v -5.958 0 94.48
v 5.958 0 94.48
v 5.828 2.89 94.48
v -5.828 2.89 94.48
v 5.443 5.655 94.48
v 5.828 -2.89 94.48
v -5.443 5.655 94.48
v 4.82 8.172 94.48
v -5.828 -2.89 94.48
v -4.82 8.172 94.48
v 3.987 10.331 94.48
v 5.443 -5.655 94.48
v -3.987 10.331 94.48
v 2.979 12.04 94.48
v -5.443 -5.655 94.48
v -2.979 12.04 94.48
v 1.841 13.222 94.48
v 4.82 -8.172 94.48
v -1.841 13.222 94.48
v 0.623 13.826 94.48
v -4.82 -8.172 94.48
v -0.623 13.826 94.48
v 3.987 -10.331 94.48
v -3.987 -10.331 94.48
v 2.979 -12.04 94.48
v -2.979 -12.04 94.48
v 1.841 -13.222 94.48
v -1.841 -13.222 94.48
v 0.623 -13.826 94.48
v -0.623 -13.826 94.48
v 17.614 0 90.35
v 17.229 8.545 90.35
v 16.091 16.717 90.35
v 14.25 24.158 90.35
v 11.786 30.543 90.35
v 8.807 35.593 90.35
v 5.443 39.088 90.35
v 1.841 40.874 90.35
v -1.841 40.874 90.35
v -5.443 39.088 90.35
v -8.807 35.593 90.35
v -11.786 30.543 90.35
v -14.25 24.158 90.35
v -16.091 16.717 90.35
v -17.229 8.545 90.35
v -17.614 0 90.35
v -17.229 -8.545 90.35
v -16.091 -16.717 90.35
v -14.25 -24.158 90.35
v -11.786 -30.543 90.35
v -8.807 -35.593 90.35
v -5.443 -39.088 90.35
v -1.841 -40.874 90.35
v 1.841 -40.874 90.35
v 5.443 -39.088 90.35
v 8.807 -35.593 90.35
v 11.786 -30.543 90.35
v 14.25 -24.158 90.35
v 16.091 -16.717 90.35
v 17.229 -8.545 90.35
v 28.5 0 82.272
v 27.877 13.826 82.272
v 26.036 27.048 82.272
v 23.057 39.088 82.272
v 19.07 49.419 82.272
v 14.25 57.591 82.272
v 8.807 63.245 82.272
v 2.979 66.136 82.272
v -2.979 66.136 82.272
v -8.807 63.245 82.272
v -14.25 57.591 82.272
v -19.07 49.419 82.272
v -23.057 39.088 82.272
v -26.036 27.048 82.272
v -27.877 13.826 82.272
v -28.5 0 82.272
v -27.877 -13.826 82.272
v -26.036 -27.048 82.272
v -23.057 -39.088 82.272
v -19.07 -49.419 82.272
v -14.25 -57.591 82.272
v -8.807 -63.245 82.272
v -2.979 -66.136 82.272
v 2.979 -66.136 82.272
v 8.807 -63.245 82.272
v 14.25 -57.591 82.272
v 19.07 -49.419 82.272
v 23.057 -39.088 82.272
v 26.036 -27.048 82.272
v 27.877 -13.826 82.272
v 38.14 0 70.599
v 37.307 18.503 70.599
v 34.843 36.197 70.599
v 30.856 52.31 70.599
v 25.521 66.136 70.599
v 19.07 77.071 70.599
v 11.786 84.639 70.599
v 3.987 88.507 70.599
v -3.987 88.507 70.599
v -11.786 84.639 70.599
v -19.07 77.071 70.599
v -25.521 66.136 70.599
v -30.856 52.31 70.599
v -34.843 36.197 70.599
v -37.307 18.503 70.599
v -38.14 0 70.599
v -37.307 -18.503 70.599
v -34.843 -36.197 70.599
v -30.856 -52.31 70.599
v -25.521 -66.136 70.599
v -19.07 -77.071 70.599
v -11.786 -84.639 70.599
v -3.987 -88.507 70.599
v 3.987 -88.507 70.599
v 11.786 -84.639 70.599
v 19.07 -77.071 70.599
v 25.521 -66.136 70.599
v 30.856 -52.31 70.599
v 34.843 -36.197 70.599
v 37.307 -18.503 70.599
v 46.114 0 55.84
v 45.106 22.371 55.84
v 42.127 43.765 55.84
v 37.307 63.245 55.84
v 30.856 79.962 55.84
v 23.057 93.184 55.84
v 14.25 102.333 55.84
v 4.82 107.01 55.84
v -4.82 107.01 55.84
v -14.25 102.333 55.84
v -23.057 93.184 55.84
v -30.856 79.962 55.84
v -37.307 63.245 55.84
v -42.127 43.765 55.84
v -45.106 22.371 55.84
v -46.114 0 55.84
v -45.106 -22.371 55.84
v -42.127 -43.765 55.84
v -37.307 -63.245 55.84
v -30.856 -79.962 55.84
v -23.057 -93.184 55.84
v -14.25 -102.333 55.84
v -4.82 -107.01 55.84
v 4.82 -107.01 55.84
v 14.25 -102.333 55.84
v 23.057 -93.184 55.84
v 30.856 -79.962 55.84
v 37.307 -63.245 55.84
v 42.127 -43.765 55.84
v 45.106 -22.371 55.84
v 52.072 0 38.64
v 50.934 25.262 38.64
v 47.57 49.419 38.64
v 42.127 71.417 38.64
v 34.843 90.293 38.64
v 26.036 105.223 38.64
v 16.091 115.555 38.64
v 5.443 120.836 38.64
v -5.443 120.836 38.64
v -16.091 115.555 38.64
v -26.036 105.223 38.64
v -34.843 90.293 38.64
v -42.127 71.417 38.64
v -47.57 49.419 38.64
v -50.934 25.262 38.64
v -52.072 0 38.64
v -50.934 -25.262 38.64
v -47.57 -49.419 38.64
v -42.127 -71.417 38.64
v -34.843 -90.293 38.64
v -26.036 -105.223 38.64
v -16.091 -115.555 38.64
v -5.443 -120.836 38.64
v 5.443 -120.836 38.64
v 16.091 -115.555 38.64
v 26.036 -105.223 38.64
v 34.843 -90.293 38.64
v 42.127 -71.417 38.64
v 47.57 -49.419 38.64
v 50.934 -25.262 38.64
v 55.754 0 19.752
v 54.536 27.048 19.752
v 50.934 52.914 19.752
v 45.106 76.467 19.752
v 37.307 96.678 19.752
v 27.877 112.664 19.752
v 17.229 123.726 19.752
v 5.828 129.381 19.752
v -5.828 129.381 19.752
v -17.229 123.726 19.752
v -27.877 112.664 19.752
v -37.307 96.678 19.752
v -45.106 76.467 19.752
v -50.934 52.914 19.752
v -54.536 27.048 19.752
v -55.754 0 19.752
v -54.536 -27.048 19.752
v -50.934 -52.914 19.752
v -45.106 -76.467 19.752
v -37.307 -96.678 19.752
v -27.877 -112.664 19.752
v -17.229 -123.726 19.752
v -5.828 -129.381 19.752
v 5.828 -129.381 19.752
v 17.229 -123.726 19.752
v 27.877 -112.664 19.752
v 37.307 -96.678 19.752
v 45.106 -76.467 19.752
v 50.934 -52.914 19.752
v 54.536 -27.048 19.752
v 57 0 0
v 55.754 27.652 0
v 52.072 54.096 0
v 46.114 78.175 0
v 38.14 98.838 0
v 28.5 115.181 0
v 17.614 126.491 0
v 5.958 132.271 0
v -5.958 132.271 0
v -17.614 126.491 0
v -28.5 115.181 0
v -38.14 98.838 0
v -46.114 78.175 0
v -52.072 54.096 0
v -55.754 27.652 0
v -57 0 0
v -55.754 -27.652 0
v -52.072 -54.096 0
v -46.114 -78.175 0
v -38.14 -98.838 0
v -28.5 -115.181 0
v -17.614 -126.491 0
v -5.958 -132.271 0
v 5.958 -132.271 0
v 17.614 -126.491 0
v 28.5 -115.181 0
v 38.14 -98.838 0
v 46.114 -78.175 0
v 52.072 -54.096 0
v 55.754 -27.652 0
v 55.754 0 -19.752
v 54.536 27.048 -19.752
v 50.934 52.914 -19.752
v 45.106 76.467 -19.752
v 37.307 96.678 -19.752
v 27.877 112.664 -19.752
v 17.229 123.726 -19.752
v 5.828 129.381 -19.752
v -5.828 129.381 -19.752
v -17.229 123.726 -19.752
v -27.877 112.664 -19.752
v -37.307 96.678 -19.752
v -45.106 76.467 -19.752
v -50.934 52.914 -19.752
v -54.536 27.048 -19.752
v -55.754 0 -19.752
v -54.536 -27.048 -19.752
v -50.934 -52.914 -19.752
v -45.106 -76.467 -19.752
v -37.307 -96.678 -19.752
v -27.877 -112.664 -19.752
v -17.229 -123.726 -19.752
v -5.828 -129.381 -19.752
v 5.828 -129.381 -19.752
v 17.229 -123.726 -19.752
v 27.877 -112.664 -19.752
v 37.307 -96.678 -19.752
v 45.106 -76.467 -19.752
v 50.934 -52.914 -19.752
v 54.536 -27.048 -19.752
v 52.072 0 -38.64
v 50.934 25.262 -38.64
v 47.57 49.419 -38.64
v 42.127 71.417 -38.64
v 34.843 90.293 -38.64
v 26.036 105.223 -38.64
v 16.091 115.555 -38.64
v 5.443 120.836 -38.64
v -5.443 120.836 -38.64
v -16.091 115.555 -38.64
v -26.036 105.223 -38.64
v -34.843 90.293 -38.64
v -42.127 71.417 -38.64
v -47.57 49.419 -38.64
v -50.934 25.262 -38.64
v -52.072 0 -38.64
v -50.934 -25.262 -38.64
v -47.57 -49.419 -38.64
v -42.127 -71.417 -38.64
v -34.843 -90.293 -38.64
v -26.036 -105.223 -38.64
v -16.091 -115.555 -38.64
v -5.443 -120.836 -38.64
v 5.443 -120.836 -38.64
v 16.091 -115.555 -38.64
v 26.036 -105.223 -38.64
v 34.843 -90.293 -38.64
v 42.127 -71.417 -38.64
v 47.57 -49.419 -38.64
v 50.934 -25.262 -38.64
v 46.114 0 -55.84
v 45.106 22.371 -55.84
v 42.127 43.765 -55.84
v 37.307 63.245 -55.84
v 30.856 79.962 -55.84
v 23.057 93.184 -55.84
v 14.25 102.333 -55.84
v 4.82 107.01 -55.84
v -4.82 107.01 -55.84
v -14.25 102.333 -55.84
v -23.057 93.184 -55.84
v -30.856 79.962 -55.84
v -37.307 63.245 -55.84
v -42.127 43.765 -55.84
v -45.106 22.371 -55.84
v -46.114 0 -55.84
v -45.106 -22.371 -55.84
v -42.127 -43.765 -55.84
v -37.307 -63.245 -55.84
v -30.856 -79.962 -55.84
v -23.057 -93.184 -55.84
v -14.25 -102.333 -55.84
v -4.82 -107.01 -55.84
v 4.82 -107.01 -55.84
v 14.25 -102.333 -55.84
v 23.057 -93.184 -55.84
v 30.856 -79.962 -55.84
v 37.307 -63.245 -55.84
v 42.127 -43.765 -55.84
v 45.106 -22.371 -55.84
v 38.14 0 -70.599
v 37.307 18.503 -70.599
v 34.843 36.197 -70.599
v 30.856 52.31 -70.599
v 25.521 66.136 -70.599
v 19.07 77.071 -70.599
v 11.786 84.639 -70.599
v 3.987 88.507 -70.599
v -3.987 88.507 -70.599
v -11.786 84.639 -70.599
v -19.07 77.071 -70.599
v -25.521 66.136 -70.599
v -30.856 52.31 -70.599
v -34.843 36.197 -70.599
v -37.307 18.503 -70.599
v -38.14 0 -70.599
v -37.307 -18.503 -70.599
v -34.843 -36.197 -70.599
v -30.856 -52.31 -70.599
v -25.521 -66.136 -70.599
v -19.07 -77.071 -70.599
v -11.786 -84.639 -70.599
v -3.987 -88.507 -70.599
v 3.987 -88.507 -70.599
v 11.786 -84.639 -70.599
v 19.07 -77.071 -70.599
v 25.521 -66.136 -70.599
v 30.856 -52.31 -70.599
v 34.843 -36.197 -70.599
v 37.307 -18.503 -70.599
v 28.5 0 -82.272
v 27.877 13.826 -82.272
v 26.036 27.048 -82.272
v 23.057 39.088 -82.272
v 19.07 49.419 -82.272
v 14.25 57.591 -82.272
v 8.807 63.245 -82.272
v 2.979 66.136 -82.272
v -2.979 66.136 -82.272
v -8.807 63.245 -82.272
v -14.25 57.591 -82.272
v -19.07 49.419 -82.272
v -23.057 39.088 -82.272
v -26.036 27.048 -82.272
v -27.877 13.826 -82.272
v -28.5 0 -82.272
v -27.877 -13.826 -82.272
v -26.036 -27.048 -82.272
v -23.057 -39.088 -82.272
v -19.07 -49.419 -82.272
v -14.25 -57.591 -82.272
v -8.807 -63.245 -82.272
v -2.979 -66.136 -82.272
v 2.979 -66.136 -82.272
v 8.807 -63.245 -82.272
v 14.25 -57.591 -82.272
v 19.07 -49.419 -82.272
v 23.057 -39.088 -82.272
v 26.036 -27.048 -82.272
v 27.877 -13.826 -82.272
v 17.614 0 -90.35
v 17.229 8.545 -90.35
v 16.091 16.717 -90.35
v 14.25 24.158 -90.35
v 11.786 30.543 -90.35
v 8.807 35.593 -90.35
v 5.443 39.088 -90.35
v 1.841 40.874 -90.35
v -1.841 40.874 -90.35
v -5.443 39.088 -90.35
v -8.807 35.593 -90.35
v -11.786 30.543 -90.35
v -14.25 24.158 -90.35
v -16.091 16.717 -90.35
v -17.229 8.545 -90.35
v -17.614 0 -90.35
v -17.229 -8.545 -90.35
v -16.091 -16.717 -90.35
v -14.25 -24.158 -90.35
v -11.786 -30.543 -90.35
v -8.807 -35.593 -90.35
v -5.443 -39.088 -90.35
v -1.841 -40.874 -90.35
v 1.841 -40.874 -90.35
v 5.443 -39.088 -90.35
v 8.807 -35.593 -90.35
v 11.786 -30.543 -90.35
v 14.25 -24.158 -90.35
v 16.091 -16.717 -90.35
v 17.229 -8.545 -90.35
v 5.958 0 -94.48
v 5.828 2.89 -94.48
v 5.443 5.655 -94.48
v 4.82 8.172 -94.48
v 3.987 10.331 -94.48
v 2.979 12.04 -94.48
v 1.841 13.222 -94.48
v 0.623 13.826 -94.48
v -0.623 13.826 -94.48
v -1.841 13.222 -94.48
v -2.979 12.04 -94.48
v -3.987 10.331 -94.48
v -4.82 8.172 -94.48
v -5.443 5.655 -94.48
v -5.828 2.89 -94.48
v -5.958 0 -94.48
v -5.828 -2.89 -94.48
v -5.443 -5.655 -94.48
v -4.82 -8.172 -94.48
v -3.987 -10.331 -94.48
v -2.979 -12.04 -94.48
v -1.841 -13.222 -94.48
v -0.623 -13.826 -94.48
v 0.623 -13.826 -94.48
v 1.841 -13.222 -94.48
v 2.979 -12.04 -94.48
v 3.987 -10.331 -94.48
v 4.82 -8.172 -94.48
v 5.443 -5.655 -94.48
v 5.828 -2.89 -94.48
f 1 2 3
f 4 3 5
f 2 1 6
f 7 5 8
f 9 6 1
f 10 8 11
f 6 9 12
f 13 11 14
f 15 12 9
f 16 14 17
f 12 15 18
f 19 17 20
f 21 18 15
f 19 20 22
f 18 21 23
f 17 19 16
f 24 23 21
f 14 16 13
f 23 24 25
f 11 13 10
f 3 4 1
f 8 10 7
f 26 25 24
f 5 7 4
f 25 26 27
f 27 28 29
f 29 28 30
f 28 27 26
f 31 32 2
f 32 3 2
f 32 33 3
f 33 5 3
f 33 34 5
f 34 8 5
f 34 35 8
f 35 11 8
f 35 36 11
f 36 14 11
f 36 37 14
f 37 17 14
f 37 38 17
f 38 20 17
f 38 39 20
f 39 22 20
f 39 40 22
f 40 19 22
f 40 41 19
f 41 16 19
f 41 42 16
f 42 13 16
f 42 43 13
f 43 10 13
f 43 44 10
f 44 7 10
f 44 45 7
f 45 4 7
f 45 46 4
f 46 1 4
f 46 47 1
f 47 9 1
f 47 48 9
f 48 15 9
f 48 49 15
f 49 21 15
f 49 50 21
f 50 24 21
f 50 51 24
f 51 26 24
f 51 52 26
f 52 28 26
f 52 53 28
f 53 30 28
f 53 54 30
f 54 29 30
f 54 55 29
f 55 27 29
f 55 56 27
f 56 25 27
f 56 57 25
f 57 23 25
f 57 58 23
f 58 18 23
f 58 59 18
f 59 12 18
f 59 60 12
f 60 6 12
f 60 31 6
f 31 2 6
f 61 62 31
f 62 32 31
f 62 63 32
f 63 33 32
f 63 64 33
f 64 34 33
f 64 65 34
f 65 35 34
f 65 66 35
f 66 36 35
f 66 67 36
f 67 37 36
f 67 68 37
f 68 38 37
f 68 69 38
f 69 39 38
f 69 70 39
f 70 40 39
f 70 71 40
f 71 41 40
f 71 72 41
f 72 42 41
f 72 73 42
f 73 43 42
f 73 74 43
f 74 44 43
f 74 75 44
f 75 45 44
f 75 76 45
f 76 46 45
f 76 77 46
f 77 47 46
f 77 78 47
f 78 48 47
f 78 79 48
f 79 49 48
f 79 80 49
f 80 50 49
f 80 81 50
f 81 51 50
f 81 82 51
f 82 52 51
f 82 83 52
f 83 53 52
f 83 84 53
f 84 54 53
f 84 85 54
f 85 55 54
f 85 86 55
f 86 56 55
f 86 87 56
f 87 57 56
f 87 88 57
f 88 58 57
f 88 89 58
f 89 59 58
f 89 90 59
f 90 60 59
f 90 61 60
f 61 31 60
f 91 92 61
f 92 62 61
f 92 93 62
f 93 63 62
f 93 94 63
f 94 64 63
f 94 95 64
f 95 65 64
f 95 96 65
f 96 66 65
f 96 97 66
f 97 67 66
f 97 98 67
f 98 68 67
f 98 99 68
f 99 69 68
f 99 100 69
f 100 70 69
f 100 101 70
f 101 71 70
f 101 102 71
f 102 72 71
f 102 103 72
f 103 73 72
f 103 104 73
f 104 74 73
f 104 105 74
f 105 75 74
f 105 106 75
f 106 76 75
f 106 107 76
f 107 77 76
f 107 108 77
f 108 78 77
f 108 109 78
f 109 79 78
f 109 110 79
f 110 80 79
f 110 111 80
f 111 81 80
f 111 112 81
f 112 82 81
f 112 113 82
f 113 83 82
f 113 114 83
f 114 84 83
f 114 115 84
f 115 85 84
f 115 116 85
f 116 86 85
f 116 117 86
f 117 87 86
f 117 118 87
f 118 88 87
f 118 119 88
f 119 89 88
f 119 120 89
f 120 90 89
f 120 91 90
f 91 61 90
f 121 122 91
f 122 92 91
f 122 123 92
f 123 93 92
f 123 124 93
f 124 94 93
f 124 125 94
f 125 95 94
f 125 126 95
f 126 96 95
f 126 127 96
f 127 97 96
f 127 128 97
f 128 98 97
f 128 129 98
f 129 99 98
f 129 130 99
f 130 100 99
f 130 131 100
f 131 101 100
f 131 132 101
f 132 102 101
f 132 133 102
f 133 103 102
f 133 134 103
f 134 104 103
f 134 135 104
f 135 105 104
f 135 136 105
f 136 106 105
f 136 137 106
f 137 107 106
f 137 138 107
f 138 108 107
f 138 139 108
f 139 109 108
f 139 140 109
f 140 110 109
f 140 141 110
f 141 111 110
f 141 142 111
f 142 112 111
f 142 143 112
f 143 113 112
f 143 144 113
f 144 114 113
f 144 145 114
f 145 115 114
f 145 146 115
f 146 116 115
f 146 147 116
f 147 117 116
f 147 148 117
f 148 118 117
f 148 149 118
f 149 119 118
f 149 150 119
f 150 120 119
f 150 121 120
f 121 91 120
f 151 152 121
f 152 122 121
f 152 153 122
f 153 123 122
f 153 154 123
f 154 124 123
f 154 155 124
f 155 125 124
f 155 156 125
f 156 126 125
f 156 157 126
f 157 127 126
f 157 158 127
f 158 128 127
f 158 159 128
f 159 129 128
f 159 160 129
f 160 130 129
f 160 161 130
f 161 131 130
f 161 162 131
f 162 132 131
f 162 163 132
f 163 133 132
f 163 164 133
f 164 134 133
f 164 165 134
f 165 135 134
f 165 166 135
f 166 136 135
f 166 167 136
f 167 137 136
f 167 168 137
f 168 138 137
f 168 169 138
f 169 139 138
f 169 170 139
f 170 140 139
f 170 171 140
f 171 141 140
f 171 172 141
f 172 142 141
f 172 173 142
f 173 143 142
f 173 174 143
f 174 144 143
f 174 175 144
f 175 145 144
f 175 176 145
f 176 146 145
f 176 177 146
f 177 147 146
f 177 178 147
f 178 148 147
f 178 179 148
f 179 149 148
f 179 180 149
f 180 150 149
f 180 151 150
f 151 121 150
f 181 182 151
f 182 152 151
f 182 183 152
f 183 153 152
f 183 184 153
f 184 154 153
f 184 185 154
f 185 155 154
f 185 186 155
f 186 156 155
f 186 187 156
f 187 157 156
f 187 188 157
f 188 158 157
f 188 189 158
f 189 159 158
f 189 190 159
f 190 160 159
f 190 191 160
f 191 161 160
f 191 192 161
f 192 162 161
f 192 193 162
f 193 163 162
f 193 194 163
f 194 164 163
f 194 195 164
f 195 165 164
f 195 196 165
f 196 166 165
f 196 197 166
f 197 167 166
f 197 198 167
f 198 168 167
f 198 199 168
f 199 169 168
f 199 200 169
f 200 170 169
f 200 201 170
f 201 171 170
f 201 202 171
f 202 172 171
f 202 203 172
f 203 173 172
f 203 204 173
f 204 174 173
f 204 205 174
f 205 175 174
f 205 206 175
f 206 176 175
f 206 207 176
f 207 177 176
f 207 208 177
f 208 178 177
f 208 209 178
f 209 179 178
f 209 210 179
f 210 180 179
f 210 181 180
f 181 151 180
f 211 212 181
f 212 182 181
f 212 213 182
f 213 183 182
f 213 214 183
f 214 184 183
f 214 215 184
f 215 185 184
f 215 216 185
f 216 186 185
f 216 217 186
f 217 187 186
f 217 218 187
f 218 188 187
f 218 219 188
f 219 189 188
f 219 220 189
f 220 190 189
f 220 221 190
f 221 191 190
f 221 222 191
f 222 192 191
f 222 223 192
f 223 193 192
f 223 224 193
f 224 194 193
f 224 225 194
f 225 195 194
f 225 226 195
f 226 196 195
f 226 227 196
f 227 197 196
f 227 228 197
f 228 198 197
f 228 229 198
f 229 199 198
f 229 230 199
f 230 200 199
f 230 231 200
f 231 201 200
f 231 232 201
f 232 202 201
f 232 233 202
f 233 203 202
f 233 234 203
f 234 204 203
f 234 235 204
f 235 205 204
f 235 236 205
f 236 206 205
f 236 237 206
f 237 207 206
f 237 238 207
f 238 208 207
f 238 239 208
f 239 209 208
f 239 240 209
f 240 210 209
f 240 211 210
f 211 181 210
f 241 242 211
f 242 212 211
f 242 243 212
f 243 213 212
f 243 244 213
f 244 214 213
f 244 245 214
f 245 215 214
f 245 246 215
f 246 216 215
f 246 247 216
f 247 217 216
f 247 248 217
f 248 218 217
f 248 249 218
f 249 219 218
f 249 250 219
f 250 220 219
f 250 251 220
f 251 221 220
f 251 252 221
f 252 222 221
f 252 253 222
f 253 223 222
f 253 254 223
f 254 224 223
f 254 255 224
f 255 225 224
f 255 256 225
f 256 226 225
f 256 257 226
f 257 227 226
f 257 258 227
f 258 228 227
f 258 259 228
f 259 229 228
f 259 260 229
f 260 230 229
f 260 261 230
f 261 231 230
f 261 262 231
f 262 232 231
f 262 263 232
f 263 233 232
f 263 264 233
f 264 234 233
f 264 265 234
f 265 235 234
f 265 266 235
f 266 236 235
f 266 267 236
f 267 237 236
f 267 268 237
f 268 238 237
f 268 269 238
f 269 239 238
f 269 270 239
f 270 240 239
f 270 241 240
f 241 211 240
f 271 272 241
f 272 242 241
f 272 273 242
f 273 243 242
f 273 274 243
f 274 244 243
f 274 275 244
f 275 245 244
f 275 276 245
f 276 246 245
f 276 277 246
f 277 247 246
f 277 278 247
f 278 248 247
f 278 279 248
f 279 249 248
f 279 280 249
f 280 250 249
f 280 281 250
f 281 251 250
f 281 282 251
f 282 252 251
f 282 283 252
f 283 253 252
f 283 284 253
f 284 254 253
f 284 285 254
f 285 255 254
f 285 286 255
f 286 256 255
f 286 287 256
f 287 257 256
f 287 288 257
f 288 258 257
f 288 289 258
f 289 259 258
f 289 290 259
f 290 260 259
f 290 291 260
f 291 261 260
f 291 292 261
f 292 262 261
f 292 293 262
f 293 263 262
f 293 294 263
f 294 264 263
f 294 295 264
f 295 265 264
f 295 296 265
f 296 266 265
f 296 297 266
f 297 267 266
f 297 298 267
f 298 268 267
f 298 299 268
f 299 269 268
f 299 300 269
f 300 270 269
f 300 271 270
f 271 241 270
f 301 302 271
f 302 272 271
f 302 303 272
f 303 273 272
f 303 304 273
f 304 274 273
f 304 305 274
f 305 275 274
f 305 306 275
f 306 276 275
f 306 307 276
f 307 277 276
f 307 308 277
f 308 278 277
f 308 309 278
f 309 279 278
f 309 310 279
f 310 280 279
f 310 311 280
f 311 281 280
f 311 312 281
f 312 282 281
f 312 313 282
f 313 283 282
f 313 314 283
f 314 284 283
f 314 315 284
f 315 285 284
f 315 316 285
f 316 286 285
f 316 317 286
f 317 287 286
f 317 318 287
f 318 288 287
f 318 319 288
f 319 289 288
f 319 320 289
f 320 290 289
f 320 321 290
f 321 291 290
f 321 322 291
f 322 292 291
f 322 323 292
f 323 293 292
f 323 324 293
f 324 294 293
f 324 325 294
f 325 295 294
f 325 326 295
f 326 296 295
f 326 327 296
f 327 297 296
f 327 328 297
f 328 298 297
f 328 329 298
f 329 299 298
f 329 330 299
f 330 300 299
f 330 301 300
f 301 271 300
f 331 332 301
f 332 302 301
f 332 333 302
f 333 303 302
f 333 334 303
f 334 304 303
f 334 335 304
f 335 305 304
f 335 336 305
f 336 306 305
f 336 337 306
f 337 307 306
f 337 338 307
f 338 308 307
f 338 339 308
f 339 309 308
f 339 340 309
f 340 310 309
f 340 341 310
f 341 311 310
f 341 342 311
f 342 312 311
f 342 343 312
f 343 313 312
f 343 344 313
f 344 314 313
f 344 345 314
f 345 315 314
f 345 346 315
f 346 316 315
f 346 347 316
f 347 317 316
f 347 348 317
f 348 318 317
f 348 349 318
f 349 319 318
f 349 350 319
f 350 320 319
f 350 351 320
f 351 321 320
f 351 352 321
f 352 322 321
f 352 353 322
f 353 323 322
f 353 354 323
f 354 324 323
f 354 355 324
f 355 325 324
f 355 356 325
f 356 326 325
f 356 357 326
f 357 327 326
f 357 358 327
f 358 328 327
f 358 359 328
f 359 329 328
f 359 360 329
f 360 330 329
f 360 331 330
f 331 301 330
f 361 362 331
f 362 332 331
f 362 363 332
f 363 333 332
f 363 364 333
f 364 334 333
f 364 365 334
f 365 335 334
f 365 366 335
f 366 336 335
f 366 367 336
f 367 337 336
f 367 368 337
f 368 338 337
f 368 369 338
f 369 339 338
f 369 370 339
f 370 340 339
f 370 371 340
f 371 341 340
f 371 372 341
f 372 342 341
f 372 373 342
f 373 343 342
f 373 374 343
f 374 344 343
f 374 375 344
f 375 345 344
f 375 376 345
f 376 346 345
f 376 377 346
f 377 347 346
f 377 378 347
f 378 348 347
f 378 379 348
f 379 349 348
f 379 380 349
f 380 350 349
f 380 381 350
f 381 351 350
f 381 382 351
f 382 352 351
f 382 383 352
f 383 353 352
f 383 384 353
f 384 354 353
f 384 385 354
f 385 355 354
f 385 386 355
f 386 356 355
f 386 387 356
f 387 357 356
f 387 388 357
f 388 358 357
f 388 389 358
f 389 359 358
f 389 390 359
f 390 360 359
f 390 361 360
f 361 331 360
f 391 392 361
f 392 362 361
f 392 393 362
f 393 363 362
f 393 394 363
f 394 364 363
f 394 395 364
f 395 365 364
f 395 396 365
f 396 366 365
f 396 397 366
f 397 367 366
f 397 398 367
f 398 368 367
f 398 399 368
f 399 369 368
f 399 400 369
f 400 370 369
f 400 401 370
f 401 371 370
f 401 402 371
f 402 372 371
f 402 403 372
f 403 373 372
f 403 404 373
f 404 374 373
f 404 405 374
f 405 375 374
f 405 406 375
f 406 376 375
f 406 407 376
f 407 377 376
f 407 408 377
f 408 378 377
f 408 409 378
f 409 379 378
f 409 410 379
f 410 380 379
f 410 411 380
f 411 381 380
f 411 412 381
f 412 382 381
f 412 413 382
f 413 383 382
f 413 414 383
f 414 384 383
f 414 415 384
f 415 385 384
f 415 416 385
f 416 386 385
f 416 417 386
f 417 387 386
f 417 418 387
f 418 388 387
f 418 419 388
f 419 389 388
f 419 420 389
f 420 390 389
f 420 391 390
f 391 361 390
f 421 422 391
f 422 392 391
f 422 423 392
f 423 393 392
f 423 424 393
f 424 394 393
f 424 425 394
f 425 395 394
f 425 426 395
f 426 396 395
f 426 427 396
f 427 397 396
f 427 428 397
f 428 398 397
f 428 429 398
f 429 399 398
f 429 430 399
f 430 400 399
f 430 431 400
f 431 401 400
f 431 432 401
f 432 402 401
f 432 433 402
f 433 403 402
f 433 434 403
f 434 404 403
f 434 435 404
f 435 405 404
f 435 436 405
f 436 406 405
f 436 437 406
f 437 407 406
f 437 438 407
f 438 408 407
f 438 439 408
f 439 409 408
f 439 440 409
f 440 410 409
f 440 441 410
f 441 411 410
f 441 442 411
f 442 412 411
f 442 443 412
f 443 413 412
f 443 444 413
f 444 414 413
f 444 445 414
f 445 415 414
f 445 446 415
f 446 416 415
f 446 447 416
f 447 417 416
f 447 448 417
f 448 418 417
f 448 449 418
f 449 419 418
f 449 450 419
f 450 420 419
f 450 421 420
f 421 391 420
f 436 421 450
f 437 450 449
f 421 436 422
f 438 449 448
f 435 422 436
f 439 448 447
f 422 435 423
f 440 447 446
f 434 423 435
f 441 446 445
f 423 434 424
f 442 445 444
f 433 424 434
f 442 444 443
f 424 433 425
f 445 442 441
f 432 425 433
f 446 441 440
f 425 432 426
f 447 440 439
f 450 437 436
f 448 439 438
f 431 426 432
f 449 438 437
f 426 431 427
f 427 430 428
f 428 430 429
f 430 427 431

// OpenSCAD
// Generated by SolidPython 1.0.1 on 2020-07-29 00:46:45


scale(v = [3, 7, 5]) {
	sphere(r = 19);
}
/***********************************************
*********      SolidPython code:      **********
************************************************
 
# import packages: SolidPython
from solid import *
from solid.utils import *
from itertools import chain, combinations, permutations


class Resize:

    def __init__(self, scad_file):
        self.scad_file = scad_file
        #self.scad_file = import_scad(scad_file)
        # cone/cylinder param:
        self.r1 = 0
        self.r2 = 0
        self.h = 0
        # rectangular prism param:
        self.w = 0
        self.l = 0
        # ellipse param:
        self.r = 0

    # import OpenScad code (file name corresponds to shape)


    # classify shape + parameters
    def assign(self, param1, param2, param3):
        if self.scad_file == 'cone.scad':
            self.r1 = param1
            self.r2 = param2
            self.h = param3
        elif self.scad_file == 'cylinder.scad':
            self.r1 = param1
            self.r2 = param2
            self.h = param3
        elif self.scad_file == 'rectangularPrism.scad':
            self.h = param1
            self.l = param2
            self.w = param3
        else:
            self.r = param1
            self.h = param2

    # resize parameters
    def iterate(self):
        x = range(3, 20, 2)
        i = 1
        if self.scad_file == 'cone.scad':
            tempList = list(permutations(x, 2))
            for temp in tempList:
                param1 = temp[0]
                param2 = temp[1]
                filepath = 'produced_scad_files/' + 'cone' + str(param1) + '_' + str(param2) + '_' + '.scad'
                scad_render_to_file(cylinder(h=param1, r1=param2, r2=0), filepath)

        elif self.scad_file == 'cylinder.scad':
            tempList = list(permutations(x, 3))
            for temp in tempList:
                param1 = temp[0]
                param2 = temp[1]
                filepath = 'produced_scad_files/' + 'cylinder' + str(param1) + '_' + str(param2) + '_' + '.scad'
                scad_render_to_file(cylinder(h=param1, r1=param2, r2=param2), filepath)

        elif self.scad_file == 'rectangularPrism.scad':
            tempList = list(permutations(x, 3))
            for temp in tempList:
                param1 = temp[0]
                param2 = temp[1]
                param3 = temp[2]
                filepath = 'produced_scad_files/' + 'rectangularPrism' + str(param1) + '_' + str(param2) + '_' + str(
                    param3) + '.scad'
                scad_render_to_file(cube(size=(param1, param2, param3)), filepath)

        elif self.scad_file == 'ellipse.scad':
            tempList = list(permutations(x, 4))
            for temp in tempList:
                param1 = temp[0]
                param2 = temp[1]
                param3 = temp[2]
                param4 = temp[3]
                filepath = 'produced_scad_files/' + 'ellipse' + str(param1) + '_' + str(param2) + '_' + str(param3) + '_' + str(param4) + '.scad'
                scad_render_to_file(scale([param1, param2, param3])(sphere(r=param4)), filepath)

    def render_to_scadfile(self):
        scad_render_to_file(scad, 'example.scad') 
 
************************************************/
